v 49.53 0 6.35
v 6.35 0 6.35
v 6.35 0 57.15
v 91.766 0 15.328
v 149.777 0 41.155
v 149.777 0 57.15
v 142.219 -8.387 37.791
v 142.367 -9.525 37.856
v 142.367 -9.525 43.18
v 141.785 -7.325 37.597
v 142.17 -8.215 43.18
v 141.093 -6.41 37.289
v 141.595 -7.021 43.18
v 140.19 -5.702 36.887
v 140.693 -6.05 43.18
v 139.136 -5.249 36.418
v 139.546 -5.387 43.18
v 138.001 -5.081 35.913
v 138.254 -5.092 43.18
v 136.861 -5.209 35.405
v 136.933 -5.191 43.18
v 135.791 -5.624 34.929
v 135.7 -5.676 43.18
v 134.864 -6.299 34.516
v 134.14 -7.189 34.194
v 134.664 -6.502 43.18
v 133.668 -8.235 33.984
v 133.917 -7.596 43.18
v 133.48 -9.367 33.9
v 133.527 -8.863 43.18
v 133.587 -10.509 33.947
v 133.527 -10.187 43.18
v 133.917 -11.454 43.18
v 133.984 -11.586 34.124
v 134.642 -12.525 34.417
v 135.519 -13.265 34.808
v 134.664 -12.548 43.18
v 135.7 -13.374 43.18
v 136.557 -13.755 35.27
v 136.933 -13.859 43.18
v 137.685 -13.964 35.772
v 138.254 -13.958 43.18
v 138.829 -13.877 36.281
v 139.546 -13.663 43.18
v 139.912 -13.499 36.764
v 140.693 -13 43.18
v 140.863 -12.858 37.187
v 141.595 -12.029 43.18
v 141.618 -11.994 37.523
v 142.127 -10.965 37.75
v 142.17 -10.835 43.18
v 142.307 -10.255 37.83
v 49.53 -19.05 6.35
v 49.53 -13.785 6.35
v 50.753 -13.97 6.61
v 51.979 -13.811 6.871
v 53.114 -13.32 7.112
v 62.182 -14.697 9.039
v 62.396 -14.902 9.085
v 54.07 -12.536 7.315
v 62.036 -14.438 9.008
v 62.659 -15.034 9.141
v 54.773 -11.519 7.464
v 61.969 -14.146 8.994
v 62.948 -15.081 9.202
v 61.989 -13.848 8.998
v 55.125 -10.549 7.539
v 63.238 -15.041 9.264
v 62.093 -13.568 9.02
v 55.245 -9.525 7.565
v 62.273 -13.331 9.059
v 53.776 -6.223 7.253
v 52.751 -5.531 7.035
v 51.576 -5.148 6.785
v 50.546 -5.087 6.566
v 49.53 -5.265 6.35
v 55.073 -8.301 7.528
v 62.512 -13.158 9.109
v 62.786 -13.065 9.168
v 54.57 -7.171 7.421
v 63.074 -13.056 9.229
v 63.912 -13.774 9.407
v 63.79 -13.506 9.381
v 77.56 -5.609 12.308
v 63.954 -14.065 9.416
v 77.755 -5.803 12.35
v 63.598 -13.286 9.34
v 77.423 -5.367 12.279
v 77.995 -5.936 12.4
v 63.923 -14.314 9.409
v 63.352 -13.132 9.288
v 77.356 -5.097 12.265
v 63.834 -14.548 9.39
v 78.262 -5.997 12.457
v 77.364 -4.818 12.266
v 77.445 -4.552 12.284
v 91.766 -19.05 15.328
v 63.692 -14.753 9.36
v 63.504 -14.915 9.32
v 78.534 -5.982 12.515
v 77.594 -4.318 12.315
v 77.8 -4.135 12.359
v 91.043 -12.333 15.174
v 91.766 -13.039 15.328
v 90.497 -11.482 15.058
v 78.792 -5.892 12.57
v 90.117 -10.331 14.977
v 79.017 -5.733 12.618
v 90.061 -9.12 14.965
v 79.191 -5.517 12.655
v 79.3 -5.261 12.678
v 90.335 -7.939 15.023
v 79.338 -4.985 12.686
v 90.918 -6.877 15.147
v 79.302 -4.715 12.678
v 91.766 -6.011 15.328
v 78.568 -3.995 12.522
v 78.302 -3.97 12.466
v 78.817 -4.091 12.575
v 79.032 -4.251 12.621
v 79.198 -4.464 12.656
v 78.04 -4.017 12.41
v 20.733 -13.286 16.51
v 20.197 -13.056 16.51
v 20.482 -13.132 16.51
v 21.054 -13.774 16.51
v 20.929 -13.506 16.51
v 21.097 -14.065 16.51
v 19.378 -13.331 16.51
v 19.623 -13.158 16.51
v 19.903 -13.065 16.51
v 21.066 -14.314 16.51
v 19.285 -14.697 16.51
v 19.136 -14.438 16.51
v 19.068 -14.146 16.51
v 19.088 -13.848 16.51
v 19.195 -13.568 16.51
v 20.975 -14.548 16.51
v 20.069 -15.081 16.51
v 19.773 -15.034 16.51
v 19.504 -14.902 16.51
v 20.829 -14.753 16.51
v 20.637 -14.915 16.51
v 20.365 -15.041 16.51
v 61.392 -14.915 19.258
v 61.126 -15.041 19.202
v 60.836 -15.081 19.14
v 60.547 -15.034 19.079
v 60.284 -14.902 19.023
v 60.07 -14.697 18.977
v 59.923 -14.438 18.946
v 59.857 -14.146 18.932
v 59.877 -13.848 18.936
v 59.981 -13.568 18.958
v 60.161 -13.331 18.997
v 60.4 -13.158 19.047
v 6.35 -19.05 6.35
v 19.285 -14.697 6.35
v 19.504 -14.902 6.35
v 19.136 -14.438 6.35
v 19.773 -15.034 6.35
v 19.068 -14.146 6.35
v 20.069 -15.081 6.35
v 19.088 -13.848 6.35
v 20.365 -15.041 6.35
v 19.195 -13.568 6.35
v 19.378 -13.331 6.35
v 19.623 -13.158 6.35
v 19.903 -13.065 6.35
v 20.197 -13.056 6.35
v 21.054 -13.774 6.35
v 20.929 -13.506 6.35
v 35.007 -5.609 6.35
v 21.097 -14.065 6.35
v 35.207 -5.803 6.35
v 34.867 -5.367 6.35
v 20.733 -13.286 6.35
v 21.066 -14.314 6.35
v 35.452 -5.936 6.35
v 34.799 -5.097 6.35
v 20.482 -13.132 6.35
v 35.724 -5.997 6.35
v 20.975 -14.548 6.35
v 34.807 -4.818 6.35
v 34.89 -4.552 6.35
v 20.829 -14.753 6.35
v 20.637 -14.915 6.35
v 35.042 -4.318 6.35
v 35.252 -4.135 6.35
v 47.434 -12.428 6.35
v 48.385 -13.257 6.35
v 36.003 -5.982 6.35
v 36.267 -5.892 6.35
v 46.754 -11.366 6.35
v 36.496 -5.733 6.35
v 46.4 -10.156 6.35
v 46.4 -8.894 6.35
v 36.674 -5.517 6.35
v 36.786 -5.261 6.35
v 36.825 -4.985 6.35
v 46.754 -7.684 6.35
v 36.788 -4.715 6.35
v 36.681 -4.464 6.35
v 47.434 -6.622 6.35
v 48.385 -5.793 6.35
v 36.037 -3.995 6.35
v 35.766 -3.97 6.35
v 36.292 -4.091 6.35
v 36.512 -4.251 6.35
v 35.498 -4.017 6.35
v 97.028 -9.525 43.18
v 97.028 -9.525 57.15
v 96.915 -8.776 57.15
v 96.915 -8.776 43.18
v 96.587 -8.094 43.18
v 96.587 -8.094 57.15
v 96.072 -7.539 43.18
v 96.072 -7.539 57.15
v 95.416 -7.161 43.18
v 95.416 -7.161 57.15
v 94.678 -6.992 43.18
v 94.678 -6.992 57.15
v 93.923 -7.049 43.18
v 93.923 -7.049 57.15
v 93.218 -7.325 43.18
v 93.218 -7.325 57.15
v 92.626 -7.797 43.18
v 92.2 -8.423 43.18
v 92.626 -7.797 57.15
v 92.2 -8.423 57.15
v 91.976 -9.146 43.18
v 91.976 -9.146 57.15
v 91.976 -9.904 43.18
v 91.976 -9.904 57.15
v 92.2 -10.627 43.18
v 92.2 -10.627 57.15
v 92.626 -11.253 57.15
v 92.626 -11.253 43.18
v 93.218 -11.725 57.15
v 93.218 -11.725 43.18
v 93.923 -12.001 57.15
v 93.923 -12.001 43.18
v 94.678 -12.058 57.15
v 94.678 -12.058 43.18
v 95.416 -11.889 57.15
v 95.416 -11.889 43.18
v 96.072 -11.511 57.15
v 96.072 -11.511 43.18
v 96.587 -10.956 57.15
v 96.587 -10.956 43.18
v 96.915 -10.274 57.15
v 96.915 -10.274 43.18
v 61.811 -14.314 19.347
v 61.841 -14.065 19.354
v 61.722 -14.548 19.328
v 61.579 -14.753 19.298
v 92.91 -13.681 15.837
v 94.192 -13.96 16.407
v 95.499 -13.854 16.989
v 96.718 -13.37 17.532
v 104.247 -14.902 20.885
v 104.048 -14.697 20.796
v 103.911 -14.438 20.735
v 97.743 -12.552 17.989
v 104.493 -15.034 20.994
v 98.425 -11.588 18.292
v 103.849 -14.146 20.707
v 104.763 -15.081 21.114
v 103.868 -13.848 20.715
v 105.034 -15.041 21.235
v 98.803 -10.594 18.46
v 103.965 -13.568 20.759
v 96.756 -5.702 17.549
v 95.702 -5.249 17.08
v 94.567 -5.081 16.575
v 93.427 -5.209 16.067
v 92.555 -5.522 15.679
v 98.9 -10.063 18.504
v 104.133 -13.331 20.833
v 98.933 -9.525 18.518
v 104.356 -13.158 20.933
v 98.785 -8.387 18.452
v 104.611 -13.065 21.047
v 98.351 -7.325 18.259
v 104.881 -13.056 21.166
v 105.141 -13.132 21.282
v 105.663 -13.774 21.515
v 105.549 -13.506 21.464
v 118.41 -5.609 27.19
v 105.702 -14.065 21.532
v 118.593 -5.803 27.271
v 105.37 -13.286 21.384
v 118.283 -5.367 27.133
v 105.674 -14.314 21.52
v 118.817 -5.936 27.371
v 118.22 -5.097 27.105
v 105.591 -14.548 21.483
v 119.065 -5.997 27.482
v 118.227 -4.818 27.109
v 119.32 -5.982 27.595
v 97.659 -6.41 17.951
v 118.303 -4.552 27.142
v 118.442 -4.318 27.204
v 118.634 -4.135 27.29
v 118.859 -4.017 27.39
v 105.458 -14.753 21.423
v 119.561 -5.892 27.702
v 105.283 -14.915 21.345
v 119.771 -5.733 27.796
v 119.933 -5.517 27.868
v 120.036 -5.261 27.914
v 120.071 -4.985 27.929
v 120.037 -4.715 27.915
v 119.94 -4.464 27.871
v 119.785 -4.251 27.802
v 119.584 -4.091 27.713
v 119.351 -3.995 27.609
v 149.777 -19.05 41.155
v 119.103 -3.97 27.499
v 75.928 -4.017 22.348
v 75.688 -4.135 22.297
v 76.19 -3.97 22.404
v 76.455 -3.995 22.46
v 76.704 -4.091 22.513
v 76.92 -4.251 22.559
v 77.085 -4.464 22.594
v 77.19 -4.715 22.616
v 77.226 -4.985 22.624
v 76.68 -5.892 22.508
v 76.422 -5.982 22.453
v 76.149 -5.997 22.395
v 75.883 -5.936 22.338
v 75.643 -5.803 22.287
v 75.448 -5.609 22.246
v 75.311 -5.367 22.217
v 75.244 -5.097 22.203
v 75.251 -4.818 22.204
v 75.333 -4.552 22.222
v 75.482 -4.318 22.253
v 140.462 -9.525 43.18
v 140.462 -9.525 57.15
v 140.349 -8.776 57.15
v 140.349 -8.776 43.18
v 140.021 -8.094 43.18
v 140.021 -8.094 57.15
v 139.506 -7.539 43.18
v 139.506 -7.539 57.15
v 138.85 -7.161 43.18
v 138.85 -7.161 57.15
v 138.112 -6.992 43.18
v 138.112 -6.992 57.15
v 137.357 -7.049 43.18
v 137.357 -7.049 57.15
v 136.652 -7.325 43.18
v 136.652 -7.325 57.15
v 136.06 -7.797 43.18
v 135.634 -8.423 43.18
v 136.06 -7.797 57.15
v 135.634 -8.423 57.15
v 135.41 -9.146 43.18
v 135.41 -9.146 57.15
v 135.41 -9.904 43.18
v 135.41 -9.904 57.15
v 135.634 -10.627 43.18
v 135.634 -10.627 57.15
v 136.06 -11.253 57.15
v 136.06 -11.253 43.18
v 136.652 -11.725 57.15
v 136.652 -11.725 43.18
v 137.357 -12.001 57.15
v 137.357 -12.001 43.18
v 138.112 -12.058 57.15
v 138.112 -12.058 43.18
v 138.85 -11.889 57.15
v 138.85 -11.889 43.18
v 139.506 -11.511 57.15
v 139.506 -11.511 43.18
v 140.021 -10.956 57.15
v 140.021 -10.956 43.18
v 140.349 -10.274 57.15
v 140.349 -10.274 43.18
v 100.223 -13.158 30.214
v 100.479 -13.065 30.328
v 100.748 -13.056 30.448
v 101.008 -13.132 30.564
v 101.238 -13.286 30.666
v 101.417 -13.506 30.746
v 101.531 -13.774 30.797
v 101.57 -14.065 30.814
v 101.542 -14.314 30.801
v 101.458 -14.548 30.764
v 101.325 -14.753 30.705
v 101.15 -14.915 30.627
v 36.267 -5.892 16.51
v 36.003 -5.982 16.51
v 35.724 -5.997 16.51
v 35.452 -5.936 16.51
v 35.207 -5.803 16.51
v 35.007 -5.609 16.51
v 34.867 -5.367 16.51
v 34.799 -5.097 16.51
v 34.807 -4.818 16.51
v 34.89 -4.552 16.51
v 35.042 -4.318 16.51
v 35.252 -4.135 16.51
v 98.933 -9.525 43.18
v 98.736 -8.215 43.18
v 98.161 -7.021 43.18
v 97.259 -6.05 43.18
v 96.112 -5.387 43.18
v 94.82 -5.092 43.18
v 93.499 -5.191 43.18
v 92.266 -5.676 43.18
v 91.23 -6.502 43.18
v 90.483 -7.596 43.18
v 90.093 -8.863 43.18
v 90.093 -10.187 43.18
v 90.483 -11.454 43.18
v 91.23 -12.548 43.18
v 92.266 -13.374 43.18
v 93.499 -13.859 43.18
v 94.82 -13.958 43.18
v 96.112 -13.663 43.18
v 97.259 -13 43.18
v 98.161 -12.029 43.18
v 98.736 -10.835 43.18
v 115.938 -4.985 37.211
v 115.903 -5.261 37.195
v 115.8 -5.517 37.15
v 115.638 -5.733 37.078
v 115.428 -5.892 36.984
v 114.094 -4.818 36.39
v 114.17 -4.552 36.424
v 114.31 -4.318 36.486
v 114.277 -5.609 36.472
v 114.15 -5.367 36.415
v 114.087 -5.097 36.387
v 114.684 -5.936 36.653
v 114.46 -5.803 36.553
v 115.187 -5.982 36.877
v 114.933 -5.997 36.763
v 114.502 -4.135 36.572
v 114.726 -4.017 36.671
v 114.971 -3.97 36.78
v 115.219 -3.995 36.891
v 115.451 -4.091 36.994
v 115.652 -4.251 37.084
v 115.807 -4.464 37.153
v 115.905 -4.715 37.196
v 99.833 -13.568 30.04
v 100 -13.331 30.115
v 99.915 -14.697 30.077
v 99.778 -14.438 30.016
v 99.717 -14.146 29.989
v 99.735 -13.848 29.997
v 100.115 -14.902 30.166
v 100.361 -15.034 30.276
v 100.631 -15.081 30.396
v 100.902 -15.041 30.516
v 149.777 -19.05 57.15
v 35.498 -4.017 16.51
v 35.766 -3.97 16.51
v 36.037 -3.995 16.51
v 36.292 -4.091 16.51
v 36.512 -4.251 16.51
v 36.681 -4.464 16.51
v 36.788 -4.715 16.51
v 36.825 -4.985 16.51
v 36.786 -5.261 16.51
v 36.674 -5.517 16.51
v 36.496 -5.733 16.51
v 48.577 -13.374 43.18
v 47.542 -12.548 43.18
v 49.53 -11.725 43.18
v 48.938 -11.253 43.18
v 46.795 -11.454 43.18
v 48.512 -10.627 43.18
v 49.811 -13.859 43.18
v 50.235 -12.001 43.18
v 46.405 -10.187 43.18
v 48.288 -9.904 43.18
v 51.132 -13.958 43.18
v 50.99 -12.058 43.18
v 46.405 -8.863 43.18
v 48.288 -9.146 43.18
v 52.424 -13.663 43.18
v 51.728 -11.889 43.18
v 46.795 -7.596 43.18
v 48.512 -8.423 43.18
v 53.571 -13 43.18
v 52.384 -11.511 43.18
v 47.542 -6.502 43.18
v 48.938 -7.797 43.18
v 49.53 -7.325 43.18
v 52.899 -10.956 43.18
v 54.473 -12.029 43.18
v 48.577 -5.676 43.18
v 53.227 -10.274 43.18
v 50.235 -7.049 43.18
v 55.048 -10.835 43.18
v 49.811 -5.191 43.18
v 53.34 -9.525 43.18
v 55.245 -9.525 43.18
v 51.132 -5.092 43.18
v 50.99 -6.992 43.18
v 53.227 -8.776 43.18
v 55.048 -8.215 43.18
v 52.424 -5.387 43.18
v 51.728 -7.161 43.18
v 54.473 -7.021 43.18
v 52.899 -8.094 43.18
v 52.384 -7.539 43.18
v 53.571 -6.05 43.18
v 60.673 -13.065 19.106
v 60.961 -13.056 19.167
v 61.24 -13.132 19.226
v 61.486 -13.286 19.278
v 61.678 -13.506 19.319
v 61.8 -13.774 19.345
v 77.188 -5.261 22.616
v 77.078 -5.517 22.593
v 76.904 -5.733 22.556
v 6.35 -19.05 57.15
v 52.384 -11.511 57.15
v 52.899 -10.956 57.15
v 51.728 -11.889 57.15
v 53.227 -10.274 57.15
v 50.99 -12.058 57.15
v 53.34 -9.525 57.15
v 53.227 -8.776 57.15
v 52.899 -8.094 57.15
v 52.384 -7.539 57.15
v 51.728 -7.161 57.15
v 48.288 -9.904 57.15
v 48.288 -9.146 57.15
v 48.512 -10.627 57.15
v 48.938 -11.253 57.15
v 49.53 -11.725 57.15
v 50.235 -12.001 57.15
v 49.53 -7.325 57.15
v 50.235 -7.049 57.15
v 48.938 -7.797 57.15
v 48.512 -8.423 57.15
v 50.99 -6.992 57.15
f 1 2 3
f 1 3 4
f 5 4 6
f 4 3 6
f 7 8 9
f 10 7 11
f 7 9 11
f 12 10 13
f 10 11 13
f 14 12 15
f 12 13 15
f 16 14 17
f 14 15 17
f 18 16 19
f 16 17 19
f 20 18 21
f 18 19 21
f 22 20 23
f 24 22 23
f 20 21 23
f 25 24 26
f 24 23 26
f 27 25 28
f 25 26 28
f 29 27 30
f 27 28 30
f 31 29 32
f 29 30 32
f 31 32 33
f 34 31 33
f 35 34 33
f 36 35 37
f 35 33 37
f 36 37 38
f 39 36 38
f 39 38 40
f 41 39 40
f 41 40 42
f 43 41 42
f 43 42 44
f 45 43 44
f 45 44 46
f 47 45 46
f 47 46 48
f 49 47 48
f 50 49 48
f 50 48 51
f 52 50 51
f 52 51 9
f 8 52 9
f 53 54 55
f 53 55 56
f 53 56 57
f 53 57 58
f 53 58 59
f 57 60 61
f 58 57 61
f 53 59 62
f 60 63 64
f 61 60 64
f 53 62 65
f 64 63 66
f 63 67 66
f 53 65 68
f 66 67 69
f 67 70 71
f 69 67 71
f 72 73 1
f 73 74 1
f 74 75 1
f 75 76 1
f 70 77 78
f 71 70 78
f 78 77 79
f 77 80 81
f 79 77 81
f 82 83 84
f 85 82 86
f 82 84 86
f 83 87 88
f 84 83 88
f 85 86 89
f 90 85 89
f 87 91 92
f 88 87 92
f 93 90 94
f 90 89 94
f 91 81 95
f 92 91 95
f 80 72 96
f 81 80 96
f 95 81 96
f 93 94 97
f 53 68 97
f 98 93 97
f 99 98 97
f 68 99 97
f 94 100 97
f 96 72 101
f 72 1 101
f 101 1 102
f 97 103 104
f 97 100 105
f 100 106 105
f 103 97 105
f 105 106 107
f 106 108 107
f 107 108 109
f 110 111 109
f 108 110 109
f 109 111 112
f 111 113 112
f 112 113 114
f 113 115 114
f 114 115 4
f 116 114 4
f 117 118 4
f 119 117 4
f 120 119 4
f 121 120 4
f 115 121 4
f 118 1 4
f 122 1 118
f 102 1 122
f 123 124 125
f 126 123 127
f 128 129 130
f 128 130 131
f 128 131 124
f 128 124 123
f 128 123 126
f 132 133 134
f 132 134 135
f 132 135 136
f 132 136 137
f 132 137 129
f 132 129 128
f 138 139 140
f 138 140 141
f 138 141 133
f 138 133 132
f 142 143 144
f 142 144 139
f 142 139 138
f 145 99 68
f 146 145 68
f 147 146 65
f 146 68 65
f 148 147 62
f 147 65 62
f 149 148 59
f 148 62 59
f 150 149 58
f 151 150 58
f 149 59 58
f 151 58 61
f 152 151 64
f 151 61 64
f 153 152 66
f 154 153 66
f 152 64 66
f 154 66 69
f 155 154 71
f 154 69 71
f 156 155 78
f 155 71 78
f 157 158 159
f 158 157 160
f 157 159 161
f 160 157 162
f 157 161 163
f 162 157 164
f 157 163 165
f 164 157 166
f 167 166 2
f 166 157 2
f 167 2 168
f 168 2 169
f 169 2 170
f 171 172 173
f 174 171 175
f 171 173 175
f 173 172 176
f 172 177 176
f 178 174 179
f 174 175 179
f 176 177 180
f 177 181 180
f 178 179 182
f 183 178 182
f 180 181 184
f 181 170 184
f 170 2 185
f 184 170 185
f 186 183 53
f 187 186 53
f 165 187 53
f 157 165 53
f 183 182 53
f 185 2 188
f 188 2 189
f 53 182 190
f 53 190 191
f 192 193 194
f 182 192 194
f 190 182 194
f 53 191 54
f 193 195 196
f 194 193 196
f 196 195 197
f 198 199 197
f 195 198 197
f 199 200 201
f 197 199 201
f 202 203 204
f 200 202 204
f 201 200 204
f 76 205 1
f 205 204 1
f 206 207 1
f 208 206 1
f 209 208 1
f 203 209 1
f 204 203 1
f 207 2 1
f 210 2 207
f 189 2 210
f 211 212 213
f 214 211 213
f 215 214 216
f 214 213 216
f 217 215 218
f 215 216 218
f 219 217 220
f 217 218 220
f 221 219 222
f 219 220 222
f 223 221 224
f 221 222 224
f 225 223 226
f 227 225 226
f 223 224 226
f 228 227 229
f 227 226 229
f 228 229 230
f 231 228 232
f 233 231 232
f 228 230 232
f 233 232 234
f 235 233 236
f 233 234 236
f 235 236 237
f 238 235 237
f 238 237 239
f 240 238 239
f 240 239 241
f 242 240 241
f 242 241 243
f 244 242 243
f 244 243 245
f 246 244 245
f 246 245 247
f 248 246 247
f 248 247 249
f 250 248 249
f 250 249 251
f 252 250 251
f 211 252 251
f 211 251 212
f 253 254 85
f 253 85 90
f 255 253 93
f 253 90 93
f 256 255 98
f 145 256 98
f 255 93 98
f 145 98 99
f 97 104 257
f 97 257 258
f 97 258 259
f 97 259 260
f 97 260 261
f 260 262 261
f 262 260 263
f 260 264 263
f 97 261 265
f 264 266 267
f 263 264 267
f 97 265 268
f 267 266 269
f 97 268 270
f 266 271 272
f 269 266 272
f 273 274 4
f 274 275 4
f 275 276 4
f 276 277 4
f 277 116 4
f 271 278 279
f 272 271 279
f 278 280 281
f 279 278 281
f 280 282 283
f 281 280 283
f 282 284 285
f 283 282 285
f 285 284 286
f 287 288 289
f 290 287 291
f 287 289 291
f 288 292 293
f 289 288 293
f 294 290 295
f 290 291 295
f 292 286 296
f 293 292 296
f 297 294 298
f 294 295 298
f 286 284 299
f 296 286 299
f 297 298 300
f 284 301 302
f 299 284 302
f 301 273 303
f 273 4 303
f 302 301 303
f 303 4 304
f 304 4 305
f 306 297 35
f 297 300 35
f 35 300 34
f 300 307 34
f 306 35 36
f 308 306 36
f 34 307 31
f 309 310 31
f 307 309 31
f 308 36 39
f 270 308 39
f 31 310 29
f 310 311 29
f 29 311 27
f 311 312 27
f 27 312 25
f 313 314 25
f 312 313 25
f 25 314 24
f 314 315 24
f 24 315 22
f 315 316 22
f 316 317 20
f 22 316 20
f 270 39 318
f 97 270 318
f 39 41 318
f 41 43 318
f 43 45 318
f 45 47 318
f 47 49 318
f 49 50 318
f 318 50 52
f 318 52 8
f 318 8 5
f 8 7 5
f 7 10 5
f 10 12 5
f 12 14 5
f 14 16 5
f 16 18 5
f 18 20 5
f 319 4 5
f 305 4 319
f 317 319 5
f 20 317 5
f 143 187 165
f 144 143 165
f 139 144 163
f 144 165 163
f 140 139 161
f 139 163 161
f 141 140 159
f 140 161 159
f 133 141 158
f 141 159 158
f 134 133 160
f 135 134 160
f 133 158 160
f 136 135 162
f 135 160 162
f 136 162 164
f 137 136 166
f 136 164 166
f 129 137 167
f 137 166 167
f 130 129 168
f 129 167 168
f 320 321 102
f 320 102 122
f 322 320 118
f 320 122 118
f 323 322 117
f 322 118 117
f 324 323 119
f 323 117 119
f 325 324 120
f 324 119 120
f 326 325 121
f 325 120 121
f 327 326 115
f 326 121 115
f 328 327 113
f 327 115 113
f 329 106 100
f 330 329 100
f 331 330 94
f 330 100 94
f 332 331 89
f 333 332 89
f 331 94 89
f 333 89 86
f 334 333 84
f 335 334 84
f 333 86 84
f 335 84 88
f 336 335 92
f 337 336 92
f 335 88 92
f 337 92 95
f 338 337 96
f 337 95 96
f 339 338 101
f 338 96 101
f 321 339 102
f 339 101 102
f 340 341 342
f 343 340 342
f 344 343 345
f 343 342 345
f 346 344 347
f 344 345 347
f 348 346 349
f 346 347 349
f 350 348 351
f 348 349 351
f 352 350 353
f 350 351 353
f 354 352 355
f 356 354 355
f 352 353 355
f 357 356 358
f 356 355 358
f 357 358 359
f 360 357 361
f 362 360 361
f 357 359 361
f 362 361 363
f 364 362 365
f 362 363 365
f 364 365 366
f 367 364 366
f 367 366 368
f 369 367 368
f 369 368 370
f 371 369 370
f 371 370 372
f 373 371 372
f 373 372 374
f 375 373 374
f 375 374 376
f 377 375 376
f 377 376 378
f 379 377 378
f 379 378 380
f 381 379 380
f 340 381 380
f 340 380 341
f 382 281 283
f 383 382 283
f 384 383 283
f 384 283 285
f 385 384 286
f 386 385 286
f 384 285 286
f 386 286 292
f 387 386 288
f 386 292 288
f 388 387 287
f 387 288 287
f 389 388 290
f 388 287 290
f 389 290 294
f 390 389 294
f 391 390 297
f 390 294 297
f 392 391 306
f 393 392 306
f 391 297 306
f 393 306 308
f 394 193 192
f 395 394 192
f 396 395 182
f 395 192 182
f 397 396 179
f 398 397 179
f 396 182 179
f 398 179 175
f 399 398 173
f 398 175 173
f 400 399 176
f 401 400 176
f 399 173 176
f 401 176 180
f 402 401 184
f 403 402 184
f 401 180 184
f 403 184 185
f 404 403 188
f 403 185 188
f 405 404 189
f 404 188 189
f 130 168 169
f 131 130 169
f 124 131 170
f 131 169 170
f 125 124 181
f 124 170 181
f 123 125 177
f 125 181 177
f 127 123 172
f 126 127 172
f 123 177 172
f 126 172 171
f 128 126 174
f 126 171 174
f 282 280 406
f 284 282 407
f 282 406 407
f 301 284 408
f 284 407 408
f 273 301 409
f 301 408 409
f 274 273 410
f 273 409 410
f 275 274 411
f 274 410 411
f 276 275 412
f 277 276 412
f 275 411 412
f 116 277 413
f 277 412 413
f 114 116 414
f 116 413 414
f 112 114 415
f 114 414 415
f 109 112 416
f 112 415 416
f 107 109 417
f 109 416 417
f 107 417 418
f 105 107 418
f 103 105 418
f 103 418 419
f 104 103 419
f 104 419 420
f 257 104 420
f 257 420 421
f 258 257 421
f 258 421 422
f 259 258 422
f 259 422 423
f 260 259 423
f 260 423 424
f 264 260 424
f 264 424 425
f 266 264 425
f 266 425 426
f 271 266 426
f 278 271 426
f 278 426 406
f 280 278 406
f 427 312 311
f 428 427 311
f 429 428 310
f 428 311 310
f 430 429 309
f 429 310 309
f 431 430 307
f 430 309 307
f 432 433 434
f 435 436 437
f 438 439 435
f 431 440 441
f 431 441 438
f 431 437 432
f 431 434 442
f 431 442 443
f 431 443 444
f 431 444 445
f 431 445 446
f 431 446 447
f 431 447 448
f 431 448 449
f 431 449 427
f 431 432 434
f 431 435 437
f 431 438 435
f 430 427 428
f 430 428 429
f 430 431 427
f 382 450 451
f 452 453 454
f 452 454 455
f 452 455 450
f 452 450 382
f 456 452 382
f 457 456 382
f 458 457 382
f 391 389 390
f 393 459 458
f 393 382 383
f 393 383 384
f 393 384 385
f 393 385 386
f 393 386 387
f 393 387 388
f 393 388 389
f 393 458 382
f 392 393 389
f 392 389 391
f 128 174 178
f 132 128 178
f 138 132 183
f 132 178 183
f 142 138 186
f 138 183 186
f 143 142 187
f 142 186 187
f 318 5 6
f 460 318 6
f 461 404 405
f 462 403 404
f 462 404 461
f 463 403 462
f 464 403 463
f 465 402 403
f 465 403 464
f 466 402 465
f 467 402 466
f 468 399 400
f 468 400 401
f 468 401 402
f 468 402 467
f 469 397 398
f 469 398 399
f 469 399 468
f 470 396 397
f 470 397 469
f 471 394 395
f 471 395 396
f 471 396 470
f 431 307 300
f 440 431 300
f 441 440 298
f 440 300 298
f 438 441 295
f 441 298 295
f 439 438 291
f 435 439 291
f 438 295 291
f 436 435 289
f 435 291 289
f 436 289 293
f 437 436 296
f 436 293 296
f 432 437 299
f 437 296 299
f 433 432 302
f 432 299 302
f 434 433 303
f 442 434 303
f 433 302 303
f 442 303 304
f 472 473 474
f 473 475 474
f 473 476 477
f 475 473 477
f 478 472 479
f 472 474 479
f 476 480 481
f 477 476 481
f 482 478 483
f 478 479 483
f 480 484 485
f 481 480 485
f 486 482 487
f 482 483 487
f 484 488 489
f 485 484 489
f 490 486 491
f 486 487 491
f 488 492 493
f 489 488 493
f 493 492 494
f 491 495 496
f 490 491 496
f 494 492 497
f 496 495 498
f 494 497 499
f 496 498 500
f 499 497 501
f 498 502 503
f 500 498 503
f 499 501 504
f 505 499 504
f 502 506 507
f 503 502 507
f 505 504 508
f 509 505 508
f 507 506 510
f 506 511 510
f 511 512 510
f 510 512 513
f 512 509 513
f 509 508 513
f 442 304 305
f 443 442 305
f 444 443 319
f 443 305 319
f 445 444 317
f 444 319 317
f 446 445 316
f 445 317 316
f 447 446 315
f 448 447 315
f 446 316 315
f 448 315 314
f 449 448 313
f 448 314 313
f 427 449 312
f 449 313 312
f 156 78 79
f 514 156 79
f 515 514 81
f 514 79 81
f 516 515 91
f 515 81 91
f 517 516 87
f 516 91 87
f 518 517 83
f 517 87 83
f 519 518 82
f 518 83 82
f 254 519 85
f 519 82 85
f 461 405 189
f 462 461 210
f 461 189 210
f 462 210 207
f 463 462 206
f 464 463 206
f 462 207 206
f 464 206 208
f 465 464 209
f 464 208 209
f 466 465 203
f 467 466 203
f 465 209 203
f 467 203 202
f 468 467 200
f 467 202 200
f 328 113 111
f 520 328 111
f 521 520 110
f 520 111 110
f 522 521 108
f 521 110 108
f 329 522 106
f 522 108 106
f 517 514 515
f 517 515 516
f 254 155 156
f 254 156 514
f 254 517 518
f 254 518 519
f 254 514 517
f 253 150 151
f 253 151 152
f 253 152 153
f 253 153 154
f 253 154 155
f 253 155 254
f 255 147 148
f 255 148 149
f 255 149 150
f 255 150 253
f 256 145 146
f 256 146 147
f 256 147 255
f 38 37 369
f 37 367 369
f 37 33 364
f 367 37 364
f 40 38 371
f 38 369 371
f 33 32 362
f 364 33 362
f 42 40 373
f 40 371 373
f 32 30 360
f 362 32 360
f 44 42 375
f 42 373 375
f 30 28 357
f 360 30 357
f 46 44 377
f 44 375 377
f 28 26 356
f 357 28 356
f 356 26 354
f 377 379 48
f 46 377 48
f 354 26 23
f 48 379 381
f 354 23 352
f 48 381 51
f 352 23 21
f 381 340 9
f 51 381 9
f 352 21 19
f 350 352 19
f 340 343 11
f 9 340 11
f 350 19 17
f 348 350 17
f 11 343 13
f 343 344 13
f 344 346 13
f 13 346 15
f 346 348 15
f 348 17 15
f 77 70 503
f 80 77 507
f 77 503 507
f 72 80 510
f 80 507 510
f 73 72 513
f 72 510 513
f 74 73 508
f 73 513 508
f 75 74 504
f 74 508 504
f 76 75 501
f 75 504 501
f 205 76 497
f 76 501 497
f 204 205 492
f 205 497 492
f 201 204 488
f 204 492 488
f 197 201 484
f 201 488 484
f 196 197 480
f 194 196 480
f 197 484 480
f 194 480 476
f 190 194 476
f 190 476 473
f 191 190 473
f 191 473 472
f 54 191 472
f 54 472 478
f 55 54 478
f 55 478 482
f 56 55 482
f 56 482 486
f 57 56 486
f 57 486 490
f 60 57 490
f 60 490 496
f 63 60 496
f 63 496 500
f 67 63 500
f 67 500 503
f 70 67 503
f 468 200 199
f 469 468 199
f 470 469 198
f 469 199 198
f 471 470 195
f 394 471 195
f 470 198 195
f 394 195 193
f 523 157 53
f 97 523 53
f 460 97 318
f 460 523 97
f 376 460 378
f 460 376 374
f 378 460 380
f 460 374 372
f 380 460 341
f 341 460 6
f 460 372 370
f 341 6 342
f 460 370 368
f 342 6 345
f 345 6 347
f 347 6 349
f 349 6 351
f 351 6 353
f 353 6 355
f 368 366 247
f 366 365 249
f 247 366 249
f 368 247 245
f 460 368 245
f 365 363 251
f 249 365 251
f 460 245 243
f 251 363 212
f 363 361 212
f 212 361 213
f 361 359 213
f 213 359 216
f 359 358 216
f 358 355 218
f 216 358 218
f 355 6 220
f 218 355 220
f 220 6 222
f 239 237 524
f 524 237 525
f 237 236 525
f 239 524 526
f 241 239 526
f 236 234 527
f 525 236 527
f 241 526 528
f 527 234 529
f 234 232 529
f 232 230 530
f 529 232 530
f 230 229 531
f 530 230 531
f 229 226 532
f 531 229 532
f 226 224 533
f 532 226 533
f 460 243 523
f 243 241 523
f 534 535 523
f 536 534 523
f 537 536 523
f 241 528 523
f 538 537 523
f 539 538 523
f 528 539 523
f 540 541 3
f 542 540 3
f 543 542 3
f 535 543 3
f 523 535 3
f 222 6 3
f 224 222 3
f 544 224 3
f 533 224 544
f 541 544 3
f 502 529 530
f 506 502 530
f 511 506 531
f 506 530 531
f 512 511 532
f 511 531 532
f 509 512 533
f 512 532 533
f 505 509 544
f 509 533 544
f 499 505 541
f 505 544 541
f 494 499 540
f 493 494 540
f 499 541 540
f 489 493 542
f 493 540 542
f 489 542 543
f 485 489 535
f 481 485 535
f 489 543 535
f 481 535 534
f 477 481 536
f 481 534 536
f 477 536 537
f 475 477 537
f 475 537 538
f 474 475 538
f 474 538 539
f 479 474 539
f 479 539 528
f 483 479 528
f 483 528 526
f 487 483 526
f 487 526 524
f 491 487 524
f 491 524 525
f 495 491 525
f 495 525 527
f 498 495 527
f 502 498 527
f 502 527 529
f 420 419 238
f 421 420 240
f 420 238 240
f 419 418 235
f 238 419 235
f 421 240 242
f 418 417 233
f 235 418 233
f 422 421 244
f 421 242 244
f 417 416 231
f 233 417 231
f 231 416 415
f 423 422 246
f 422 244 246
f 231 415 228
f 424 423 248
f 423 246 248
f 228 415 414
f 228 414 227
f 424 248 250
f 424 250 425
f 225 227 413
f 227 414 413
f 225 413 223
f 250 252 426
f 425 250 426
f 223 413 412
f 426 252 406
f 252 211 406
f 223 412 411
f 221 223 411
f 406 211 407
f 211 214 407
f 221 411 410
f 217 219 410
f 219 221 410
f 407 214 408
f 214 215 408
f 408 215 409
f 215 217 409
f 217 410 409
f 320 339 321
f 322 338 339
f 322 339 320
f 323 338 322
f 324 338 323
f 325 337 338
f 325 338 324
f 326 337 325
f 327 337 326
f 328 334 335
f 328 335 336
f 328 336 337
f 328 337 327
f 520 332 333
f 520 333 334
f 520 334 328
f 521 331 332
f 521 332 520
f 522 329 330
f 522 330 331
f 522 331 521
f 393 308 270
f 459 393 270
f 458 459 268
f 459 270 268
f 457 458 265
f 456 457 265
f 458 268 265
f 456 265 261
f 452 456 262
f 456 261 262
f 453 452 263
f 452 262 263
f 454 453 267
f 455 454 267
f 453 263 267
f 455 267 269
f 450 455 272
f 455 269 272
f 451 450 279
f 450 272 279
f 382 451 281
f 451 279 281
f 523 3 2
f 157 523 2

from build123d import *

# Parameters (mm, degrees)
F1_DEPTH  = 19.05
F2_R      = 2.54
F3_DEPTH  = 50.801
F4_START  = -13.97
F2_R_2    = 4.445
F4_DEPTH  = 40.386
F6_DEPTH  = 10.16
F8_DEPTH  = 10.16
F10_DEPTH = 10.16


with BuildPart() as f1:
    # F0 (on Front) → F1 (new body)
    with BuildSketch(Plane.XZ):
        Polygon((149.77654996, 57.15), (6.35, 57.15), (6.35, 6.35), (49.53, 6.35), (91.7664133997, 15.3276268095), (149.77654996, 41.1554036448), align=None)
    extrude(amount=F1_DEPTH)

    # F2 (on face) → F3 (cut, through all)
    with BuildSketch(Plane.XY.offset(57.15)):
        with Locations((50.8, -9.525)):
            Circle(F2_R)
        with Locations((94.488, -9.525)):
            Circle(F2_R)
        with Locations((137.922, -9.525)):
            Circle(F2_R)
    extrude(amount=-F3_DEPTH, mode=Mode.SUBTRACT)

    # F2 (on face) → F4 (cut)
    with BuildSketch(Plane.XY.offset(57.15).offset(F4_START)):
        with Locations((50.8, -9.525)):
            Circle(F2_R_2)
        with Locations((50.8, -9.525)):
            Circle(F2_R, mode=Mode.SUBTRACT)
        with Locations((94.488, -9.525)):
            Circle(F2_R_2)
        with Locations((94.488, -9.525)):
            Circle(F2_R, mode=Mode.SUBTRACT)
        with Locations((137.922, -9.525)):
            Circle(F2_R_2)
        with Locations((137.922, -9.525)):
            Circle(F2_R, mode=Mode.SUBTRACT)
    extrude(amount=-F4_DEPTH, mode=Mode.SUBTRACT)

    # F5 (on face) → F6 (cut)
    with BuildSketch(Plane(origin=(0, 0, 6.35), x_dir=(1, 0, 0), z_dir=(0, 0, -1))):
        with BuildLine():
            ThreePointArc((21.0968814449, 14.0652501177), (20.97463405, 14.5484294642), (20.6373100259, 14.915334369))
            ThreePointArc((20.6373100259, 14.915334369), (20.0808814449, 14.0652501177), (19.6229011784, 13.1583267056))
            ThreePointArc((19.6229011784, 13.1583267056), (20.6133042324, 13.1999282265), (21.0968814449, 14.0652501177))
        make_face()
        with BuildLine():
            ThreePointArc((19.6229011784, 13.1583267056), (20.0808814449, 14.0652501177), (20.6373100259, 14.915334369))
            ThreePointArc((20.6373100259, 14.915334369), (19.2009996347, 14.5732501177), (19.6229011784, 13.1583267056))
        make_face()
        with BuildLine():
            ThreePointArc((36.8247688031, 4.9847501177), (36.6740906943, 5.5171729052), (36.2667490696, 5.8916735299))
            ThreePointArc((36.2667490696, 5.8916735299), (35.8087688031, 4.9847501177), (35.2523402221, 4.1346658664))
            ThreePointArc((35.2523402221, 4.1346658664), (36.2919481496, 4.0909975126), (36.8247688031, 4.9847501177))
        make_face()
        with BuildLine():
            ThreePointArc((35.2523402221, 4.1346658664), (35.8087688031, 4.9847501177), (36.2667490696, 5.8916735299))
            ThreePointArc((36.2667490696, 5.8916735299), (34.9288869928, 5.4927501177), (35.2523402221, 4.1346658664))
        make_face()
    extrude(amount=-F6_DEPTH, mode=Mode.SUBTRACT)

    # F7 (on face) → F8 (cut)
    with BuildSketch(Plane(origin=(0.8496578997, 0, -3.9973261378), x_dir=(0.9781476007, 0, 0.2079116908), z_dir=(0.2079116908, 0, -0.9781476007))):
        with BuildLine():
            ThreePointArc((64.5139077337, 14.0652501177), (64.3916603388, 14.5484294642), (64.0543363147, 14.915334369))
            ThreePointArc((64.0543363147, 14.915334369), (63.4979077337, 14.0652501177), (63.0399274672, 13.1583267056))
            ThreePointArc((63.0399274672, 13.1583267056), (64.0303305212, 13.1999282265), (64.5139077337, 14.0652501177))
        make_face()
        with BuildLine():
            ThreePointArc((63.0399274672, 13.1583267056), (63.4979077337, 14.0652501177), (64.0543363147, 14.915334369))
            ThreePointArc((64.0543363147, 14.915334369), (62.6180259235, 14.5732501177), (63.0399274672, 13.1583267056))
        make_face()
        with BuildLine():
            ThreePointArc((80.2417950919, 4.9847501177), (80.0911169831, 5.5171729052), (79.6837753584, 5.8916735299))
            ThreePointArc((79.6837753584, 5.8916735299), (79.2257950919, 4.9847501177), (78.6693665109, 4.1346658664))
            ThreePointArc((78.6693665109, 4.1346658664), (79.7089744384, 4.0909975126), (80.2417950919, 4.9847501177))
        make_face()
        with BuildLine():
            ThreePointArc((78.6693665109, 4.1346658664), (79.2257950919, 4.9847501177), (79.6837753584, 5.8916735299))
            ThreePointArc((79.6837753584, 5.8916735299), (78.3459132816, 5.4927501177), (78.6693665109, 4.1346658664))
        make_face()
    extrude(amount=-F8_DEPTH, mode=Mode.SUBTRACT)

    # F9 (on face) → F10 (cut)
    with BuildSketch(Plane(origin=(9.4860255039, 0, -21.30596212), x_dir=(0.9135454576, 0, 0.4067366431), z_dir=(0.4067366431, 0, -0.9135454576))):
        with BuildLine():
            ThreePointArc((105.3219744595, 14.06525), (105.1997270646, 14.5484293465), (104.8624030404, 14.9153342513))
            ThreePointArc((104.8624030404, 14.9153342513), (104.3059744595, 14.06525), (103.847994193, 13.1583265879))
            ThreePointArc((103.847994193, 13.1583265879), (104.8383972469, 13.1999281088), (105.3219744595, 14.06525))
        make_face()
        with BuildLine():
            ThreePointArc((103.847994193, 13.1583265879), (104.3059744595, 14.06525), (104.8624030404, 14.9153342513))
            ThreePointArc((104.8624030404, 14.9153342513), (103.4260926492, 14.57325), (103.847994193, 13.1583265879))
        make_face()
        with BuildLine():
            ThreePointArc((121.0498618176, 4.98475), (120.8991837088, 5.5171727875), (120.4918420841, 5.8916734121))
            ThreePointArc((120.4918420841, 5.8916734121), (120.0338618176, 4.98475), (119.4774332367, 4.1346657487))
            ThreePointArc((119.4774332367, 4.1346657487), (120.5170411641, 4.0909973949), (121.0498618176, 4.98475))
        make_face()
        with BuildLine():
            ThreePointArc((119.4774332367, 4.1346657487), (120.0338618176, 4.98475), (120.4918420841, 5.8916734121))
            ThreePointArc((120.4918420841, 5.8916734121), (119.1539800074, 5.49275), (119.4774332367, 4.1346657487))
        make_face()
    extrude(amount=-F10_DEPTH, mode=Mode.SUBTRACT)


solid = f1.part
